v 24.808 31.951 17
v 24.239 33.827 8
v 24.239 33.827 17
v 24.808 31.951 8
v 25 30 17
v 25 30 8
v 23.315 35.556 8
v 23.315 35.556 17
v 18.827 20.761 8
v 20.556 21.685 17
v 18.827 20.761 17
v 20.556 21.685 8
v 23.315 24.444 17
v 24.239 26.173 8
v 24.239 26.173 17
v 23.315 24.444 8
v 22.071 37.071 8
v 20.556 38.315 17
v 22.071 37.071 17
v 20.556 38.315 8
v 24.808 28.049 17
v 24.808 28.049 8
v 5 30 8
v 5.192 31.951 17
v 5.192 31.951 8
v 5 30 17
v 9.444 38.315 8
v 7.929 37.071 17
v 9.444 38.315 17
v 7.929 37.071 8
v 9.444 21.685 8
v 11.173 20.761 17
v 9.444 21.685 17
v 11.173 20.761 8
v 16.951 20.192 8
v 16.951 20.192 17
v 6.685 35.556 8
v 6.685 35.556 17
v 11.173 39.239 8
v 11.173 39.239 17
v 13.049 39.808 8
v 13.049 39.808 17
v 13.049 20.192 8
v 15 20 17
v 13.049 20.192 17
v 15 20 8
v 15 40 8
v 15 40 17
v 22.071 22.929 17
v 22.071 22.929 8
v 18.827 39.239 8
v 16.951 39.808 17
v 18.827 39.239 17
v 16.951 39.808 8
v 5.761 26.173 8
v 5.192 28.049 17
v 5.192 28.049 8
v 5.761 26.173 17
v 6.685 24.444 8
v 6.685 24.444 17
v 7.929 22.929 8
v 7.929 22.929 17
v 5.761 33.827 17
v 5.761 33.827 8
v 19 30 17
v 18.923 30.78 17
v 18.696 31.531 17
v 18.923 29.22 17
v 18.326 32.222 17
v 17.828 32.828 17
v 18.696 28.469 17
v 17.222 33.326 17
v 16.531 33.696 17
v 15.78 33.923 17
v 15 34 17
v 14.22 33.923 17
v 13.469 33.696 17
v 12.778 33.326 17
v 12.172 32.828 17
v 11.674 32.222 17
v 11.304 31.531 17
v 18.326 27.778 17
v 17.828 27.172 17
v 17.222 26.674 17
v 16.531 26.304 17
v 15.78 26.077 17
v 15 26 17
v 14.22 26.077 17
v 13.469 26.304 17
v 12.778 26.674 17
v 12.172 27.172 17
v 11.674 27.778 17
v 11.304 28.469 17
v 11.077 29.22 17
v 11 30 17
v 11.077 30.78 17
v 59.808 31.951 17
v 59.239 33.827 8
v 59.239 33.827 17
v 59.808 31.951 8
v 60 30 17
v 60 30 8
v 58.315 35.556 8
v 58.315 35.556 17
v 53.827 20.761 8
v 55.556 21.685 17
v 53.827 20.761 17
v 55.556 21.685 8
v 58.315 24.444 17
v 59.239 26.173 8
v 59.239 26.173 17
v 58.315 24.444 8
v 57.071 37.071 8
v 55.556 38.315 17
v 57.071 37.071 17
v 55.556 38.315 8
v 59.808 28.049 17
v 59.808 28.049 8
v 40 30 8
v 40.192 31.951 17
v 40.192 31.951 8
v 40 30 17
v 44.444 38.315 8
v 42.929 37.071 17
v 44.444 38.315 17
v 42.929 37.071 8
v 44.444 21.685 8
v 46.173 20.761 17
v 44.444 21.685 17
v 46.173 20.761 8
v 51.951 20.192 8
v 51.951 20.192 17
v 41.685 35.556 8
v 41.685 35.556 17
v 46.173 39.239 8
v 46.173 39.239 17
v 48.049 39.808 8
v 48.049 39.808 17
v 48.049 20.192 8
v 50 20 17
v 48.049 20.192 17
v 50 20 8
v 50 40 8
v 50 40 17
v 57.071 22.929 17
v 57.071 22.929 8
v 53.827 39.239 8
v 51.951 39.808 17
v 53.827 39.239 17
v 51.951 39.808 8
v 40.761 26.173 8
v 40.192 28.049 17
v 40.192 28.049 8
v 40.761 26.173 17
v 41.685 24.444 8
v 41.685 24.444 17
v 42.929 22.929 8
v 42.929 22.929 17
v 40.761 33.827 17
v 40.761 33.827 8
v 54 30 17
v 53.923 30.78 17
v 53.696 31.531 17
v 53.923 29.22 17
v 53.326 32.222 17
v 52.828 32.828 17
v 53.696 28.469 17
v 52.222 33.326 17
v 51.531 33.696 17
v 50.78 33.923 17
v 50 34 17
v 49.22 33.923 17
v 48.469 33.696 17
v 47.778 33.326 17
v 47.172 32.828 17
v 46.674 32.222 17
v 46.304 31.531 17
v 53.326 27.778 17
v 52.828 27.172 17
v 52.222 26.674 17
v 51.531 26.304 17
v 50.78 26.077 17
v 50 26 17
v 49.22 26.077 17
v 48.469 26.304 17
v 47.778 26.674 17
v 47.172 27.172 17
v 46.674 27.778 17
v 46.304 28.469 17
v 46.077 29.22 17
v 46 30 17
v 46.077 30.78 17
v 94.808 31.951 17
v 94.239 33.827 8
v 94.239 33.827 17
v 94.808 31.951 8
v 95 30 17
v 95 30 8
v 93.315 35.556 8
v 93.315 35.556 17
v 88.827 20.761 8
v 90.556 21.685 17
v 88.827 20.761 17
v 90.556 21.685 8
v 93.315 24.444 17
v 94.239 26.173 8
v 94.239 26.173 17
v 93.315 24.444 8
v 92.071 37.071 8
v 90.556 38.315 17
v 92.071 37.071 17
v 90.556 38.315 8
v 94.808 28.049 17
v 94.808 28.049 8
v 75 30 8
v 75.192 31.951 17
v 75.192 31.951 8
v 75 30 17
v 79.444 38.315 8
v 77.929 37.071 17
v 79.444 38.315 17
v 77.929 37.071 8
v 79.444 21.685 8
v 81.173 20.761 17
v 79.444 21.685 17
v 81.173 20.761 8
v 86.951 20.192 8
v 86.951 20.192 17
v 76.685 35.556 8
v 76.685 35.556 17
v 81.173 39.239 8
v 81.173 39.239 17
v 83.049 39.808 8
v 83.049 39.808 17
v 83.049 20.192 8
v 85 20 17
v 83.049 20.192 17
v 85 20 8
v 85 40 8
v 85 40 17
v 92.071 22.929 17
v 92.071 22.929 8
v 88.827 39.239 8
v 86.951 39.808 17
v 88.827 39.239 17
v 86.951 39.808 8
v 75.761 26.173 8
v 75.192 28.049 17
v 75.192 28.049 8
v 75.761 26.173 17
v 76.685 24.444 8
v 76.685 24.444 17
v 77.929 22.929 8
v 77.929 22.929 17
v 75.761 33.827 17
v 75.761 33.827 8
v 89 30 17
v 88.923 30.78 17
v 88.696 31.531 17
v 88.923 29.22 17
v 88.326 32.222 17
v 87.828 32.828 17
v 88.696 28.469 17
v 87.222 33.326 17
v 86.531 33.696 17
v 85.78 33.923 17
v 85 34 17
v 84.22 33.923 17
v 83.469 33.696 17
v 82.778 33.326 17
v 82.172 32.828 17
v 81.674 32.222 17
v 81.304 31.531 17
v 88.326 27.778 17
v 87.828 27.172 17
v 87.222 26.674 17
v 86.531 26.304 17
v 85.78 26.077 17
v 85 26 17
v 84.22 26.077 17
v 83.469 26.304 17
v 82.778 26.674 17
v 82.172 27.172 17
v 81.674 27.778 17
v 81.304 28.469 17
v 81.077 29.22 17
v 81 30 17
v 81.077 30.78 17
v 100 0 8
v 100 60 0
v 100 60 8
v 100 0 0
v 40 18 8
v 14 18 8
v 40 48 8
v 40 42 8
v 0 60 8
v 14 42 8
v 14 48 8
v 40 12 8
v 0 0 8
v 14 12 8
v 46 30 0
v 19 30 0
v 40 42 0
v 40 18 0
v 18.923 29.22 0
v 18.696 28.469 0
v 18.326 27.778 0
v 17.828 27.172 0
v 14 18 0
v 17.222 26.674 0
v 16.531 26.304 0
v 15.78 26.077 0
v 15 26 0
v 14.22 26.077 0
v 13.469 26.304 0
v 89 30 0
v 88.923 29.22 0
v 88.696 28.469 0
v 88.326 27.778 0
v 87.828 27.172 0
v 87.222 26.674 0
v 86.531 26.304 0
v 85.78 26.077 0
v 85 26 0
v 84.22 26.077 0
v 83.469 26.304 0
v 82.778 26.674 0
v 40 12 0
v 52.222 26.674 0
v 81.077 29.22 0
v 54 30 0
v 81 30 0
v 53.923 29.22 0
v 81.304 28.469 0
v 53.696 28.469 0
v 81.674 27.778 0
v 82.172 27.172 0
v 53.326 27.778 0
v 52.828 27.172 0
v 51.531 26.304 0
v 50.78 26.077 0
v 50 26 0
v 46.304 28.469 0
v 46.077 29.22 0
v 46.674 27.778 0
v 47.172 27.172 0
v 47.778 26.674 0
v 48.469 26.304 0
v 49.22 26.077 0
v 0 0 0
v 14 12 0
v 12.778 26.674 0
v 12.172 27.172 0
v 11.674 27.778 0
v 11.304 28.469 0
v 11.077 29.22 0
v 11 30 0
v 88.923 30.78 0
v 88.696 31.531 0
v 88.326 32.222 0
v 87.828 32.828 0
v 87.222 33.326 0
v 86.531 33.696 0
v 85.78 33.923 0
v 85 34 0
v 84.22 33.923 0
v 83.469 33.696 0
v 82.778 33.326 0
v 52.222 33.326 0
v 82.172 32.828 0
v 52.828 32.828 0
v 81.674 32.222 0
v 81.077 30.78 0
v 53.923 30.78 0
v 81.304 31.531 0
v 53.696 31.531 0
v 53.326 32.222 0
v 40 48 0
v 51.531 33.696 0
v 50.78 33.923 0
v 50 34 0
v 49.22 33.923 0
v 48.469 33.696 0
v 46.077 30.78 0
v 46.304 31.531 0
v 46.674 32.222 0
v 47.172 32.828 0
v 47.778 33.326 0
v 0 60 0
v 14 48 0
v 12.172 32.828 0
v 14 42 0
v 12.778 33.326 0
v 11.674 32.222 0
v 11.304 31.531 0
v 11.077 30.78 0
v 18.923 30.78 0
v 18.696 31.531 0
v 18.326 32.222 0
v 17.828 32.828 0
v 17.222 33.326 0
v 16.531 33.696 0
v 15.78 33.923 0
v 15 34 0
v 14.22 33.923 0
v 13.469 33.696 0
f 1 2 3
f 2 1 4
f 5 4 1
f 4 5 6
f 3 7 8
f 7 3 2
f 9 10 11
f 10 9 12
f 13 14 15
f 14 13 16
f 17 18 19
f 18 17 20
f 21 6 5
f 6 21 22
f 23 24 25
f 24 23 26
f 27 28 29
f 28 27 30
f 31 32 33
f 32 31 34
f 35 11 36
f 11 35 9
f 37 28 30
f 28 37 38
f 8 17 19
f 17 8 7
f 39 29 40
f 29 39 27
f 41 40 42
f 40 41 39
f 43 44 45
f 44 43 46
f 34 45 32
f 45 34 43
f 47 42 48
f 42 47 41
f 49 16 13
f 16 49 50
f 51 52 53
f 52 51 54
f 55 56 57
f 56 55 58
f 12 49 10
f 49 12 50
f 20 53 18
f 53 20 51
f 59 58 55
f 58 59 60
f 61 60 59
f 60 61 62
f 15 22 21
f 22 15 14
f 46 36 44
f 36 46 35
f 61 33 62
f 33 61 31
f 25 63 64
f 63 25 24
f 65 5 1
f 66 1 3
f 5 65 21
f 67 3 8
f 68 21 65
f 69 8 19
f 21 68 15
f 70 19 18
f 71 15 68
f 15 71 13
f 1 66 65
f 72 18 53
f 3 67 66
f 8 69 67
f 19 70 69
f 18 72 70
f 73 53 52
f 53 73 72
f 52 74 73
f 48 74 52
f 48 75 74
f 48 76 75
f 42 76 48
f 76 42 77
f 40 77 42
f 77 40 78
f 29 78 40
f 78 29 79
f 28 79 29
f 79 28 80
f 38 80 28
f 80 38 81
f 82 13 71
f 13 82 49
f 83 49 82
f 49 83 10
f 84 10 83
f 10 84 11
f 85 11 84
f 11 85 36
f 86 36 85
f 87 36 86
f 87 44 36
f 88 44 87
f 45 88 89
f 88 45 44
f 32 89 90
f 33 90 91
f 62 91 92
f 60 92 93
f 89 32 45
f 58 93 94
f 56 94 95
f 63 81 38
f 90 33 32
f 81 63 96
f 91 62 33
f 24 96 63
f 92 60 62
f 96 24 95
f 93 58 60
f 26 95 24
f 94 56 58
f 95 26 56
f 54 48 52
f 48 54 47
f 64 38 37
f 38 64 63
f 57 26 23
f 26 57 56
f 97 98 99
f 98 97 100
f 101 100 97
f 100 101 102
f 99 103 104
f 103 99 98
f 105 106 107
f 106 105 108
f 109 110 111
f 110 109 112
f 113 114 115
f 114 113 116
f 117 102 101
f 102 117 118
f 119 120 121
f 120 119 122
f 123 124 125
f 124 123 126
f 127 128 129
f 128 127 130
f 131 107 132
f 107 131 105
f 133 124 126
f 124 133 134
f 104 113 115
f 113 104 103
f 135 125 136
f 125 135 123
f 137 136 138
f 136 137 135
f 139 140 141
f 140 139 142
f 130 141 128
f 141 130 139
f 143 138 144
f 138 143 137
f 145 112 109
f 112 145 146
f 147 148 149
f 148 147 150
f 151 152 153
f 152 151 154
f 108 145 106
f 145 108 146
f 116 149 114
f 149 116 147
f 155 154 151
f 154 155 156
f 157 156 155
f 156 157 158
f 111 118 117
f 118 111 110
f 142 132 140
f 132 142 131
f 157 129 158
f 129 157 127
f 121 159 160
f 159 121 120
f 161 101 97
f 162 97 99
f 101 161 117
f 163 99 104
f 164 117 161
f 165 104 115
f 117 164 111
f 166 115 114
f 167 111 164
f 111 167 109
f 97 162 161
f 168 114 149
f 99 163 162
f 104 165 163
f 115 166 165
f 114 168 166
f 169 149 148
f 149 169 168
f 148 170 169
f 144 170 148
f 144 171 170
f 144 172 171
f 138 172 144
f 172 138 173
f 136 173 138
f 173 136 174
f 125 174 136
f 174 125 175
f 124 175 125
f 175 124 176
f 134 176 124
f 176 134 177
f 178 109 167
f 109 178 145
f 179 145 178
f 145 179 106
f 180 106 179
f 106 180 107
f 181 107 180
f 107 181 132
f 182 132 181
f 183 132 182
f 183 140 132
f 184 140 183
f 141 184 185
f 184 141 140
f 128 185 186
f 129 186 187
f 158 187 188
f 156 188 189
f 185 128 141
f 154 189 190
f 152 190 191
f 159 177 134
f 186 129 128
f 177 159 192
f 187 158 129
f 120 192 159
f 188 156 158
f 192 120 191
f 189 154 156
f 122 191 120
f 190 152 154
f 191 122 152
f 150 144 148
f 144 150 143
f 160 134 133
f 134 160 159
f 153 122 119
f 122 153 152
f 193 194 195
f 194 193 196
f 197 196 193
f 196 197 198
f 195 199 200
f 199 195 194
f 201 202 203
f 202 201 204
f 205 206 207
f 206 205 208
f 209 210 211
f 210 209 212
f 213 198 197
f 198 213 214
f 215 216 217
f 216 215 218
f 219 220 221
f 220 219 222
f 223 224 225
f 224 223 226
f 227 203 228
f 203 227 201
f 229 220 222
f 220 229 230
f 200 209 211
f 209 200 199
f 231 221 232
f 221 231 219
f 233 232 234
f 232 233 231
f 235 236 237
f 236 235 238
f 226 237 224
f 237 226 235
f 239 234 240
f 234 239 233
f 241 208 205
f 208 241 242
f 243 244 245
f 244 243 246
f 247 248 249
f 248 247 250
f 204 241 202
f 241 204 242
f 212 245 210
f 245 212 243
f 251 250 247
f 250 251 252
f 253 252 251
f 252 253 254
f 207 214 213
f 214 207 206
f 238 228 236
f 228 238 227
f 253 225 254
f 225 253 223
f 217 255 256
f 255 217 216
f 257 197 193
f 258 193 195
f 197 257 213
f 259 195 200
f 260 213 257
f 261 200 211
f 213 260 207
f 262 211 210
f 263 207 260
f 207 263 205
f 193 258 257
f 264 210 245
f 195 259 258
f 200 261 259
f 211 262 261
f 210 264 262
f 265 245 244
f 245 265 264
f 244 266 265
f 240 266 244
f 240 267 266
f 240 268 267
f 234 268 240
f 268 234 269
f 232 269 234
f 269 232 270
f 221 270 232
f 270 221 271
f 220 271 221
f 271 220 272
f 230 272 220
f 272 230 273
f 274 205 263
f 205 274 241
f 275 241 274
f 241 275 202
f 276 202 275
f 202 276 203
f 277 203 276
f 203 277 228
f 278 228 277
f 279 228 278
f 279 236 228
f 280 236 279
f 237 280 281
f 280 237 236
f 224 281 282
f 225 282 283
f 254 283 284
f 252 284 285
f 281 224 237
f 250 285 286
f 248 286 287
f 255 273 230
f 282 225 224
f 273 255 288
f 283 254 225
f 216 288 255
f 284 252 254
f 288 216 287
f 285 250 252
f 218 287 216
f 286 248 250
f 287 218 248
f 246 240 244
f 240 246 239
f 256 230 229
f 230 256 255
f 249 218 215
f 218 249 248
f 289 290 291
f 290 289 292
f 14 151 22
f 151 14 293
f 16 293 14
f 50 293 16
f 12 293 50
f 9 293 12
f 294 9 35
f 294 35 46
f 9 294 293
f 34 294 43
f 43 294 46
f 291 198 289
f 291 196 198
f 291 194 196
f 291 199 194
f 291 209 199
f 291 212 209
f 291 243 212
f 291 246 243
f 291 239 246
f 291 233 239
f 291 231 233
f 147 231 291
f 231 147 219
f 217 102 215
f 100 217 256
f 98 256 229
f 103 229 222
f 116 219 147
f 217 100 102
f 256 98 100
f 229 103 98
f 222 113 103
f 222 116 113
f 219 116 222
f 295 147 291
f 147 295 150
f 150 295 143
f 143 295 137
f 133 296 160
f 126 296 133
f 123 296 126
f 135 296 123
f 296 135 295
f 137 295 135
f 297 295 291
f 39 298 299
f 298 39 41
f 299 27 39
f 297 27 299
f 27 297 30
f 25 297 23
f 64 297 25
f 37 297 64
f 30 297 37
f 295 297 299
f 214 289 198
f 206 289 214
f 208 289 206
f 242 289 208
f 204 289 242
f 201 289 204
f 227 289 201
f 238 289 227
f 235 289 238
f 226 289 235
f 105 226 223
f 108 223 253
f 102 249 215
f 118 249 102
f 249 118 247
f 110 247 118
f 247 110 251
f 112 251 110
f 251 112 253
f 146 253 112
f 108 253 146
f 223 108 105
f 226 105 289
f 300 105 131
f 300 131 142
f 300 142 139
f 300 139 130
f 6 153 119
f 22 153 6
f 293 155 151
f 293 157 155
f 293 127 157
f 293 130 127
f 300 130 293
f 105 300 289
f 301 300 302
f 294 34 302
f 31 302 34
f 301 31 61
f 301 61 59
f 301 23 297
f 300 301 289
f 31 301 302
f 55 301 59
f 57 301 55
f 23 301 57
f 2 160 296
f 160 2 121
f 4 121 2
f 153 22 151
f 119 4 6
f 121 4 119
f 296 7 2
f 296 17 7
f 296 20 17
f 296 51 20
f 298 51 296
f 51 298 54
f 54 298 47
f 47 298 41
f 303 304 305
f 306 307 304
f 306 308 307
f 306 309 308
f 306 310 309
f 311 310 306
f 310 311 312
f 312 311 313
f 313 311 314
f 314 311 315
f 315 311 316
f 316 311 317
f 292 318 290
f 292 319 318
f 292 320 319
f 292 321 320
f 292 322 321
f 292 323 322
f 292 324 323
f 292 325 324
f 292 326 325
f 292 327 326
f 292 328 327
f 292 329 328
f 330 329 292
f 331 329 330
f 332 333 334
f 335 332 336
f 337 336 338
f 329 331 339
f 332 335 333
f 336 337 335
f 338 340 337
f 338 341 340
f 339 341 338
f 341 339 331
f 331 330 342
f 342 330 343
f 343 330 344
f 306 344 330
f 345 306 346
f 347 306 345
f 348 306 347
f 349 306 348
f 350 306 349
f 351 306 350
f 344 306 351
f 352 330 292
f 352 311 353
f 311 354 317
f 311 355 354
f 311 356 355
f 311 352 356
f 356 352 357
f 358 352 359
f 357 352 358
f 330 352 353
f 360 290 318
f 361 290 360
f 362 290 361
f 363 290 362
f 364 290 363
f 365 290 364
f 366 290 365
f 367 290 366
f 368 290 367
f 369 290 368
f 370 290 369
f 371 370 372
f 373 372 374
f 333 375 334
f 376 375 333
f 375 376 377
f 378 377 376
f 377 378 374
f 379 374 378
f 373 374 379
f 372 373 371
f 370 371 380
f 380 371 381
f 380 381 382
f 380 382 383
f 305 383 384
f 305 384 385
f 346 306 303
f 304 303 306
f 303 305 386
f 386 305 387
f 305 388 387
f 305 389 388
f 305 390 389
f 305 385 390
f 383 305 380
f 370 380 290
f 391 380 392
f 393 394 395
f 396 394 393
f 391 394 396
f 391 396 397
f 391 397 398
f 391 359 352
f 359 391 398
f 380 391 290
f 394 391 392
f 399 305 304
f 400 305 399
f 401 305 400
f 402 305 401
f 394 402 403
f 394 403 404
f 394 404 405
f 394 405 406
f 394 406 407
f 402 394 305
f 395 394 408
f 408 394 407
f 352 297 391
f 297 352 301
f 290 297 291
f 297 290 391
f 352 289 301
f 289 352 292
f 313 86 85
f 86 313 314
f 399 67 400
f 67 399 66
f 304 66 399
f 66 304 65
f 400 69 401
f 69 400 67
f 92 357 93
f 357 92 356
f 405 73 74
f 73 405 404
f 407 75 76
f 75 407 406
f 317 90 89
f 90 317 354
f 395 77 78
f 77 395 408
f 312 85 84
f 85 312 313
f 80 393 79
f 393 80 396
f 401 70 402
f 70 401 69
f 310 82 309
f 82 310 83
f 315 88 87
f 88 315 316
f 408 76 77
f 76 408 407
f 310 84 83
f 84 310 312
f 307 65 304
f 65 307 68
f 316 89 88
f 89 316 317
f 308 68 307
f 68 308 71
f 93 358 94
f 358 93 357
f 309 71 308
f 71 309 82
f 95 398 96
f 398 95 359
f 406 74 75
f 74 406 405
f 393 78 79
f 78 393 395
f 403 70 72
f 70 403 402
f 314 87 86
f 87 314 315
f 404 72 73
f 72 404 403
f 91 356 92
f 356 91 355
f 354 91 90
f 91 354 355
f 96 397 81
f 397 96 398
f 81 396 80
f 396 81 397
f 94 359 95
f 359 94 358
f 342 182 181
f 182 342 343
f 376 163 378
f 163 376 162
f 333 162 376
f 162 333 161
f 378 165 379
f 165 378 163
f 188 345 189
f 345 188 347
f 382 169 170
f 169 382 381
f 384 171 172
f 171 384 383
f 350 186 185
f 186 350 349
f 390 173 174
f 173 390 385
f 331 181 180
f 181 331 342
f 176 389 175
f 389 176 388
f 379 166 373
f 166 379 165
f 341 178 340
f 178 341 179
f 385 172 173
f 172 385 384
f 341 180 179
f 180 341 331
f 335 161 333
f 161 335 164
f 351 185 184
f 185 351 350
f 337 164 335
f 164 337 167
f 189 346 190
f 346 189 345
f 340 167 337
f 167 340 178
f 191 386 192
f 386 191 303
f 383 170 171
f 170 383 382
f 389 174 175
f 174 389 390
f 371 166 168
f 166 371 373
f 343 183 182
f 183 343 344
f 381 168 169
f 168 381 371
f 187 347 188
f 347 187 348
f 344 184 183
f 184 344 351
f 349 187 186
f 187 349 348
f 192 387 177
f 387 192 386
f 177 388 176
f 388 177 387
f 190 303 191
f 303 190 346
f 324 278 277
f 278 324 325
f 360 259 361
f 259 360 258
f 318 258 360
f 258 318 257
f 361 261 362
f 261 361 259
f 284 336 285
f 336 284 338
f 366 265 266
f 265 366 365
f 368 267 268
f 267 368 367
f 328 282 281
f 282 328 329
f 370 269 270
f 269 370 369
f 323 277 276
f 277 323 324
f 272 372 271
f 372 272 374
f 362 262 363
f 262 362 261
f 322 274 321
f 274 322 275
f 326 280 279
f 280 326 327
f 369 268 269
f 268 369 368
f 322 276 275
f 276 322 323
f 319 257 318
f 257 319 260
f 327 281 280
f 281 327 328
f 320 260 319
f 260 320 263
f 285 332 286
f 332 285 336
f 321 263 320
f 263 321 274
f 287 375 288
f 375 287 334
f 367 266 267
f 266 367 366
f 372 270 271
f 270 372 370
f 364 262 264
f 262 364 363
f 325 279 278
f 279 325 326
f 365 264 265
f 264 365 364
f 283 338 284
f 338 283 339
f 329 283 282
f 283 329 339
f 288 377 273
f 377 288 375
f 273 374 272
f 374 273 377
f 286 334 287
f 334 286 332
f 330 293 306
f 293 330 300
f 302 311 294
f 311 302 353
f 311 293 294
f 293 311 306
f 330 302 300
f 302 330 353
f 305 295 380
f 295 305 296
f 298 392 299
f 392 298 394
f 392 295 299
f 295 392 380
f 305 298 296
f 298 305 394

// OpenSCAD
$fn = 32;

// ----------------------------------------------------------------------
// Drill jig: three_boss_slot jig
// ----------------------------------------------------------------------

// --- parameters (mm) ---
plate_l = 100;            // plate length, X
plate_w = 60;             // plate width, Y
plate_t = 8;              // plate thickness
boss_d = 20;              // guide boss diameter
boss_h = 10;              // boss height above the plate
guide_d = 8;              // guide hole diameter
boss_pitch = 35;          // boss pitch
slot_w = 6;               // clamp slot width
slot_l = 26;              // clamp slot length
slot_x = 14;              // slot start X
fit_tol = 0.05;           // tolerance for press fits, mm
free_tol = 0.2;           // tolerance for clearance fits, mm

n_boss = 3;  // guide bosses
boss_x0 = (plate_l - (n_boss - 1) * boss_pitch) / 2;  // first boss X
boss_top = plate_t - 1 + boss_h;  // boss crown height
total_h = boss_top;  // overall height

difference() {
  union() {
  cube([plate_l, plate_w, plate_t]);
  for (i = [0 : n_boss - 1])
    translate([boss_x0 + i * boss_pitch, plate_w / 2, plate_t - 1])
      cylinder(h = boss_h, d = boss_d);
  }
  for (i = [0 : n_boss - 1])
    translate([boss_x0 + i * boss_pitch, plate_w / 2, -1])
      cylinder(h = plate_t + boss_h, d = guide_d);
  for (cy = [plate_w * 0.25, plate_w * 0.75])
    translate([slot_x, cy - slot_w / 2, -1])
      cube([slot_l, slot_w, plate_t + 2]);
}
